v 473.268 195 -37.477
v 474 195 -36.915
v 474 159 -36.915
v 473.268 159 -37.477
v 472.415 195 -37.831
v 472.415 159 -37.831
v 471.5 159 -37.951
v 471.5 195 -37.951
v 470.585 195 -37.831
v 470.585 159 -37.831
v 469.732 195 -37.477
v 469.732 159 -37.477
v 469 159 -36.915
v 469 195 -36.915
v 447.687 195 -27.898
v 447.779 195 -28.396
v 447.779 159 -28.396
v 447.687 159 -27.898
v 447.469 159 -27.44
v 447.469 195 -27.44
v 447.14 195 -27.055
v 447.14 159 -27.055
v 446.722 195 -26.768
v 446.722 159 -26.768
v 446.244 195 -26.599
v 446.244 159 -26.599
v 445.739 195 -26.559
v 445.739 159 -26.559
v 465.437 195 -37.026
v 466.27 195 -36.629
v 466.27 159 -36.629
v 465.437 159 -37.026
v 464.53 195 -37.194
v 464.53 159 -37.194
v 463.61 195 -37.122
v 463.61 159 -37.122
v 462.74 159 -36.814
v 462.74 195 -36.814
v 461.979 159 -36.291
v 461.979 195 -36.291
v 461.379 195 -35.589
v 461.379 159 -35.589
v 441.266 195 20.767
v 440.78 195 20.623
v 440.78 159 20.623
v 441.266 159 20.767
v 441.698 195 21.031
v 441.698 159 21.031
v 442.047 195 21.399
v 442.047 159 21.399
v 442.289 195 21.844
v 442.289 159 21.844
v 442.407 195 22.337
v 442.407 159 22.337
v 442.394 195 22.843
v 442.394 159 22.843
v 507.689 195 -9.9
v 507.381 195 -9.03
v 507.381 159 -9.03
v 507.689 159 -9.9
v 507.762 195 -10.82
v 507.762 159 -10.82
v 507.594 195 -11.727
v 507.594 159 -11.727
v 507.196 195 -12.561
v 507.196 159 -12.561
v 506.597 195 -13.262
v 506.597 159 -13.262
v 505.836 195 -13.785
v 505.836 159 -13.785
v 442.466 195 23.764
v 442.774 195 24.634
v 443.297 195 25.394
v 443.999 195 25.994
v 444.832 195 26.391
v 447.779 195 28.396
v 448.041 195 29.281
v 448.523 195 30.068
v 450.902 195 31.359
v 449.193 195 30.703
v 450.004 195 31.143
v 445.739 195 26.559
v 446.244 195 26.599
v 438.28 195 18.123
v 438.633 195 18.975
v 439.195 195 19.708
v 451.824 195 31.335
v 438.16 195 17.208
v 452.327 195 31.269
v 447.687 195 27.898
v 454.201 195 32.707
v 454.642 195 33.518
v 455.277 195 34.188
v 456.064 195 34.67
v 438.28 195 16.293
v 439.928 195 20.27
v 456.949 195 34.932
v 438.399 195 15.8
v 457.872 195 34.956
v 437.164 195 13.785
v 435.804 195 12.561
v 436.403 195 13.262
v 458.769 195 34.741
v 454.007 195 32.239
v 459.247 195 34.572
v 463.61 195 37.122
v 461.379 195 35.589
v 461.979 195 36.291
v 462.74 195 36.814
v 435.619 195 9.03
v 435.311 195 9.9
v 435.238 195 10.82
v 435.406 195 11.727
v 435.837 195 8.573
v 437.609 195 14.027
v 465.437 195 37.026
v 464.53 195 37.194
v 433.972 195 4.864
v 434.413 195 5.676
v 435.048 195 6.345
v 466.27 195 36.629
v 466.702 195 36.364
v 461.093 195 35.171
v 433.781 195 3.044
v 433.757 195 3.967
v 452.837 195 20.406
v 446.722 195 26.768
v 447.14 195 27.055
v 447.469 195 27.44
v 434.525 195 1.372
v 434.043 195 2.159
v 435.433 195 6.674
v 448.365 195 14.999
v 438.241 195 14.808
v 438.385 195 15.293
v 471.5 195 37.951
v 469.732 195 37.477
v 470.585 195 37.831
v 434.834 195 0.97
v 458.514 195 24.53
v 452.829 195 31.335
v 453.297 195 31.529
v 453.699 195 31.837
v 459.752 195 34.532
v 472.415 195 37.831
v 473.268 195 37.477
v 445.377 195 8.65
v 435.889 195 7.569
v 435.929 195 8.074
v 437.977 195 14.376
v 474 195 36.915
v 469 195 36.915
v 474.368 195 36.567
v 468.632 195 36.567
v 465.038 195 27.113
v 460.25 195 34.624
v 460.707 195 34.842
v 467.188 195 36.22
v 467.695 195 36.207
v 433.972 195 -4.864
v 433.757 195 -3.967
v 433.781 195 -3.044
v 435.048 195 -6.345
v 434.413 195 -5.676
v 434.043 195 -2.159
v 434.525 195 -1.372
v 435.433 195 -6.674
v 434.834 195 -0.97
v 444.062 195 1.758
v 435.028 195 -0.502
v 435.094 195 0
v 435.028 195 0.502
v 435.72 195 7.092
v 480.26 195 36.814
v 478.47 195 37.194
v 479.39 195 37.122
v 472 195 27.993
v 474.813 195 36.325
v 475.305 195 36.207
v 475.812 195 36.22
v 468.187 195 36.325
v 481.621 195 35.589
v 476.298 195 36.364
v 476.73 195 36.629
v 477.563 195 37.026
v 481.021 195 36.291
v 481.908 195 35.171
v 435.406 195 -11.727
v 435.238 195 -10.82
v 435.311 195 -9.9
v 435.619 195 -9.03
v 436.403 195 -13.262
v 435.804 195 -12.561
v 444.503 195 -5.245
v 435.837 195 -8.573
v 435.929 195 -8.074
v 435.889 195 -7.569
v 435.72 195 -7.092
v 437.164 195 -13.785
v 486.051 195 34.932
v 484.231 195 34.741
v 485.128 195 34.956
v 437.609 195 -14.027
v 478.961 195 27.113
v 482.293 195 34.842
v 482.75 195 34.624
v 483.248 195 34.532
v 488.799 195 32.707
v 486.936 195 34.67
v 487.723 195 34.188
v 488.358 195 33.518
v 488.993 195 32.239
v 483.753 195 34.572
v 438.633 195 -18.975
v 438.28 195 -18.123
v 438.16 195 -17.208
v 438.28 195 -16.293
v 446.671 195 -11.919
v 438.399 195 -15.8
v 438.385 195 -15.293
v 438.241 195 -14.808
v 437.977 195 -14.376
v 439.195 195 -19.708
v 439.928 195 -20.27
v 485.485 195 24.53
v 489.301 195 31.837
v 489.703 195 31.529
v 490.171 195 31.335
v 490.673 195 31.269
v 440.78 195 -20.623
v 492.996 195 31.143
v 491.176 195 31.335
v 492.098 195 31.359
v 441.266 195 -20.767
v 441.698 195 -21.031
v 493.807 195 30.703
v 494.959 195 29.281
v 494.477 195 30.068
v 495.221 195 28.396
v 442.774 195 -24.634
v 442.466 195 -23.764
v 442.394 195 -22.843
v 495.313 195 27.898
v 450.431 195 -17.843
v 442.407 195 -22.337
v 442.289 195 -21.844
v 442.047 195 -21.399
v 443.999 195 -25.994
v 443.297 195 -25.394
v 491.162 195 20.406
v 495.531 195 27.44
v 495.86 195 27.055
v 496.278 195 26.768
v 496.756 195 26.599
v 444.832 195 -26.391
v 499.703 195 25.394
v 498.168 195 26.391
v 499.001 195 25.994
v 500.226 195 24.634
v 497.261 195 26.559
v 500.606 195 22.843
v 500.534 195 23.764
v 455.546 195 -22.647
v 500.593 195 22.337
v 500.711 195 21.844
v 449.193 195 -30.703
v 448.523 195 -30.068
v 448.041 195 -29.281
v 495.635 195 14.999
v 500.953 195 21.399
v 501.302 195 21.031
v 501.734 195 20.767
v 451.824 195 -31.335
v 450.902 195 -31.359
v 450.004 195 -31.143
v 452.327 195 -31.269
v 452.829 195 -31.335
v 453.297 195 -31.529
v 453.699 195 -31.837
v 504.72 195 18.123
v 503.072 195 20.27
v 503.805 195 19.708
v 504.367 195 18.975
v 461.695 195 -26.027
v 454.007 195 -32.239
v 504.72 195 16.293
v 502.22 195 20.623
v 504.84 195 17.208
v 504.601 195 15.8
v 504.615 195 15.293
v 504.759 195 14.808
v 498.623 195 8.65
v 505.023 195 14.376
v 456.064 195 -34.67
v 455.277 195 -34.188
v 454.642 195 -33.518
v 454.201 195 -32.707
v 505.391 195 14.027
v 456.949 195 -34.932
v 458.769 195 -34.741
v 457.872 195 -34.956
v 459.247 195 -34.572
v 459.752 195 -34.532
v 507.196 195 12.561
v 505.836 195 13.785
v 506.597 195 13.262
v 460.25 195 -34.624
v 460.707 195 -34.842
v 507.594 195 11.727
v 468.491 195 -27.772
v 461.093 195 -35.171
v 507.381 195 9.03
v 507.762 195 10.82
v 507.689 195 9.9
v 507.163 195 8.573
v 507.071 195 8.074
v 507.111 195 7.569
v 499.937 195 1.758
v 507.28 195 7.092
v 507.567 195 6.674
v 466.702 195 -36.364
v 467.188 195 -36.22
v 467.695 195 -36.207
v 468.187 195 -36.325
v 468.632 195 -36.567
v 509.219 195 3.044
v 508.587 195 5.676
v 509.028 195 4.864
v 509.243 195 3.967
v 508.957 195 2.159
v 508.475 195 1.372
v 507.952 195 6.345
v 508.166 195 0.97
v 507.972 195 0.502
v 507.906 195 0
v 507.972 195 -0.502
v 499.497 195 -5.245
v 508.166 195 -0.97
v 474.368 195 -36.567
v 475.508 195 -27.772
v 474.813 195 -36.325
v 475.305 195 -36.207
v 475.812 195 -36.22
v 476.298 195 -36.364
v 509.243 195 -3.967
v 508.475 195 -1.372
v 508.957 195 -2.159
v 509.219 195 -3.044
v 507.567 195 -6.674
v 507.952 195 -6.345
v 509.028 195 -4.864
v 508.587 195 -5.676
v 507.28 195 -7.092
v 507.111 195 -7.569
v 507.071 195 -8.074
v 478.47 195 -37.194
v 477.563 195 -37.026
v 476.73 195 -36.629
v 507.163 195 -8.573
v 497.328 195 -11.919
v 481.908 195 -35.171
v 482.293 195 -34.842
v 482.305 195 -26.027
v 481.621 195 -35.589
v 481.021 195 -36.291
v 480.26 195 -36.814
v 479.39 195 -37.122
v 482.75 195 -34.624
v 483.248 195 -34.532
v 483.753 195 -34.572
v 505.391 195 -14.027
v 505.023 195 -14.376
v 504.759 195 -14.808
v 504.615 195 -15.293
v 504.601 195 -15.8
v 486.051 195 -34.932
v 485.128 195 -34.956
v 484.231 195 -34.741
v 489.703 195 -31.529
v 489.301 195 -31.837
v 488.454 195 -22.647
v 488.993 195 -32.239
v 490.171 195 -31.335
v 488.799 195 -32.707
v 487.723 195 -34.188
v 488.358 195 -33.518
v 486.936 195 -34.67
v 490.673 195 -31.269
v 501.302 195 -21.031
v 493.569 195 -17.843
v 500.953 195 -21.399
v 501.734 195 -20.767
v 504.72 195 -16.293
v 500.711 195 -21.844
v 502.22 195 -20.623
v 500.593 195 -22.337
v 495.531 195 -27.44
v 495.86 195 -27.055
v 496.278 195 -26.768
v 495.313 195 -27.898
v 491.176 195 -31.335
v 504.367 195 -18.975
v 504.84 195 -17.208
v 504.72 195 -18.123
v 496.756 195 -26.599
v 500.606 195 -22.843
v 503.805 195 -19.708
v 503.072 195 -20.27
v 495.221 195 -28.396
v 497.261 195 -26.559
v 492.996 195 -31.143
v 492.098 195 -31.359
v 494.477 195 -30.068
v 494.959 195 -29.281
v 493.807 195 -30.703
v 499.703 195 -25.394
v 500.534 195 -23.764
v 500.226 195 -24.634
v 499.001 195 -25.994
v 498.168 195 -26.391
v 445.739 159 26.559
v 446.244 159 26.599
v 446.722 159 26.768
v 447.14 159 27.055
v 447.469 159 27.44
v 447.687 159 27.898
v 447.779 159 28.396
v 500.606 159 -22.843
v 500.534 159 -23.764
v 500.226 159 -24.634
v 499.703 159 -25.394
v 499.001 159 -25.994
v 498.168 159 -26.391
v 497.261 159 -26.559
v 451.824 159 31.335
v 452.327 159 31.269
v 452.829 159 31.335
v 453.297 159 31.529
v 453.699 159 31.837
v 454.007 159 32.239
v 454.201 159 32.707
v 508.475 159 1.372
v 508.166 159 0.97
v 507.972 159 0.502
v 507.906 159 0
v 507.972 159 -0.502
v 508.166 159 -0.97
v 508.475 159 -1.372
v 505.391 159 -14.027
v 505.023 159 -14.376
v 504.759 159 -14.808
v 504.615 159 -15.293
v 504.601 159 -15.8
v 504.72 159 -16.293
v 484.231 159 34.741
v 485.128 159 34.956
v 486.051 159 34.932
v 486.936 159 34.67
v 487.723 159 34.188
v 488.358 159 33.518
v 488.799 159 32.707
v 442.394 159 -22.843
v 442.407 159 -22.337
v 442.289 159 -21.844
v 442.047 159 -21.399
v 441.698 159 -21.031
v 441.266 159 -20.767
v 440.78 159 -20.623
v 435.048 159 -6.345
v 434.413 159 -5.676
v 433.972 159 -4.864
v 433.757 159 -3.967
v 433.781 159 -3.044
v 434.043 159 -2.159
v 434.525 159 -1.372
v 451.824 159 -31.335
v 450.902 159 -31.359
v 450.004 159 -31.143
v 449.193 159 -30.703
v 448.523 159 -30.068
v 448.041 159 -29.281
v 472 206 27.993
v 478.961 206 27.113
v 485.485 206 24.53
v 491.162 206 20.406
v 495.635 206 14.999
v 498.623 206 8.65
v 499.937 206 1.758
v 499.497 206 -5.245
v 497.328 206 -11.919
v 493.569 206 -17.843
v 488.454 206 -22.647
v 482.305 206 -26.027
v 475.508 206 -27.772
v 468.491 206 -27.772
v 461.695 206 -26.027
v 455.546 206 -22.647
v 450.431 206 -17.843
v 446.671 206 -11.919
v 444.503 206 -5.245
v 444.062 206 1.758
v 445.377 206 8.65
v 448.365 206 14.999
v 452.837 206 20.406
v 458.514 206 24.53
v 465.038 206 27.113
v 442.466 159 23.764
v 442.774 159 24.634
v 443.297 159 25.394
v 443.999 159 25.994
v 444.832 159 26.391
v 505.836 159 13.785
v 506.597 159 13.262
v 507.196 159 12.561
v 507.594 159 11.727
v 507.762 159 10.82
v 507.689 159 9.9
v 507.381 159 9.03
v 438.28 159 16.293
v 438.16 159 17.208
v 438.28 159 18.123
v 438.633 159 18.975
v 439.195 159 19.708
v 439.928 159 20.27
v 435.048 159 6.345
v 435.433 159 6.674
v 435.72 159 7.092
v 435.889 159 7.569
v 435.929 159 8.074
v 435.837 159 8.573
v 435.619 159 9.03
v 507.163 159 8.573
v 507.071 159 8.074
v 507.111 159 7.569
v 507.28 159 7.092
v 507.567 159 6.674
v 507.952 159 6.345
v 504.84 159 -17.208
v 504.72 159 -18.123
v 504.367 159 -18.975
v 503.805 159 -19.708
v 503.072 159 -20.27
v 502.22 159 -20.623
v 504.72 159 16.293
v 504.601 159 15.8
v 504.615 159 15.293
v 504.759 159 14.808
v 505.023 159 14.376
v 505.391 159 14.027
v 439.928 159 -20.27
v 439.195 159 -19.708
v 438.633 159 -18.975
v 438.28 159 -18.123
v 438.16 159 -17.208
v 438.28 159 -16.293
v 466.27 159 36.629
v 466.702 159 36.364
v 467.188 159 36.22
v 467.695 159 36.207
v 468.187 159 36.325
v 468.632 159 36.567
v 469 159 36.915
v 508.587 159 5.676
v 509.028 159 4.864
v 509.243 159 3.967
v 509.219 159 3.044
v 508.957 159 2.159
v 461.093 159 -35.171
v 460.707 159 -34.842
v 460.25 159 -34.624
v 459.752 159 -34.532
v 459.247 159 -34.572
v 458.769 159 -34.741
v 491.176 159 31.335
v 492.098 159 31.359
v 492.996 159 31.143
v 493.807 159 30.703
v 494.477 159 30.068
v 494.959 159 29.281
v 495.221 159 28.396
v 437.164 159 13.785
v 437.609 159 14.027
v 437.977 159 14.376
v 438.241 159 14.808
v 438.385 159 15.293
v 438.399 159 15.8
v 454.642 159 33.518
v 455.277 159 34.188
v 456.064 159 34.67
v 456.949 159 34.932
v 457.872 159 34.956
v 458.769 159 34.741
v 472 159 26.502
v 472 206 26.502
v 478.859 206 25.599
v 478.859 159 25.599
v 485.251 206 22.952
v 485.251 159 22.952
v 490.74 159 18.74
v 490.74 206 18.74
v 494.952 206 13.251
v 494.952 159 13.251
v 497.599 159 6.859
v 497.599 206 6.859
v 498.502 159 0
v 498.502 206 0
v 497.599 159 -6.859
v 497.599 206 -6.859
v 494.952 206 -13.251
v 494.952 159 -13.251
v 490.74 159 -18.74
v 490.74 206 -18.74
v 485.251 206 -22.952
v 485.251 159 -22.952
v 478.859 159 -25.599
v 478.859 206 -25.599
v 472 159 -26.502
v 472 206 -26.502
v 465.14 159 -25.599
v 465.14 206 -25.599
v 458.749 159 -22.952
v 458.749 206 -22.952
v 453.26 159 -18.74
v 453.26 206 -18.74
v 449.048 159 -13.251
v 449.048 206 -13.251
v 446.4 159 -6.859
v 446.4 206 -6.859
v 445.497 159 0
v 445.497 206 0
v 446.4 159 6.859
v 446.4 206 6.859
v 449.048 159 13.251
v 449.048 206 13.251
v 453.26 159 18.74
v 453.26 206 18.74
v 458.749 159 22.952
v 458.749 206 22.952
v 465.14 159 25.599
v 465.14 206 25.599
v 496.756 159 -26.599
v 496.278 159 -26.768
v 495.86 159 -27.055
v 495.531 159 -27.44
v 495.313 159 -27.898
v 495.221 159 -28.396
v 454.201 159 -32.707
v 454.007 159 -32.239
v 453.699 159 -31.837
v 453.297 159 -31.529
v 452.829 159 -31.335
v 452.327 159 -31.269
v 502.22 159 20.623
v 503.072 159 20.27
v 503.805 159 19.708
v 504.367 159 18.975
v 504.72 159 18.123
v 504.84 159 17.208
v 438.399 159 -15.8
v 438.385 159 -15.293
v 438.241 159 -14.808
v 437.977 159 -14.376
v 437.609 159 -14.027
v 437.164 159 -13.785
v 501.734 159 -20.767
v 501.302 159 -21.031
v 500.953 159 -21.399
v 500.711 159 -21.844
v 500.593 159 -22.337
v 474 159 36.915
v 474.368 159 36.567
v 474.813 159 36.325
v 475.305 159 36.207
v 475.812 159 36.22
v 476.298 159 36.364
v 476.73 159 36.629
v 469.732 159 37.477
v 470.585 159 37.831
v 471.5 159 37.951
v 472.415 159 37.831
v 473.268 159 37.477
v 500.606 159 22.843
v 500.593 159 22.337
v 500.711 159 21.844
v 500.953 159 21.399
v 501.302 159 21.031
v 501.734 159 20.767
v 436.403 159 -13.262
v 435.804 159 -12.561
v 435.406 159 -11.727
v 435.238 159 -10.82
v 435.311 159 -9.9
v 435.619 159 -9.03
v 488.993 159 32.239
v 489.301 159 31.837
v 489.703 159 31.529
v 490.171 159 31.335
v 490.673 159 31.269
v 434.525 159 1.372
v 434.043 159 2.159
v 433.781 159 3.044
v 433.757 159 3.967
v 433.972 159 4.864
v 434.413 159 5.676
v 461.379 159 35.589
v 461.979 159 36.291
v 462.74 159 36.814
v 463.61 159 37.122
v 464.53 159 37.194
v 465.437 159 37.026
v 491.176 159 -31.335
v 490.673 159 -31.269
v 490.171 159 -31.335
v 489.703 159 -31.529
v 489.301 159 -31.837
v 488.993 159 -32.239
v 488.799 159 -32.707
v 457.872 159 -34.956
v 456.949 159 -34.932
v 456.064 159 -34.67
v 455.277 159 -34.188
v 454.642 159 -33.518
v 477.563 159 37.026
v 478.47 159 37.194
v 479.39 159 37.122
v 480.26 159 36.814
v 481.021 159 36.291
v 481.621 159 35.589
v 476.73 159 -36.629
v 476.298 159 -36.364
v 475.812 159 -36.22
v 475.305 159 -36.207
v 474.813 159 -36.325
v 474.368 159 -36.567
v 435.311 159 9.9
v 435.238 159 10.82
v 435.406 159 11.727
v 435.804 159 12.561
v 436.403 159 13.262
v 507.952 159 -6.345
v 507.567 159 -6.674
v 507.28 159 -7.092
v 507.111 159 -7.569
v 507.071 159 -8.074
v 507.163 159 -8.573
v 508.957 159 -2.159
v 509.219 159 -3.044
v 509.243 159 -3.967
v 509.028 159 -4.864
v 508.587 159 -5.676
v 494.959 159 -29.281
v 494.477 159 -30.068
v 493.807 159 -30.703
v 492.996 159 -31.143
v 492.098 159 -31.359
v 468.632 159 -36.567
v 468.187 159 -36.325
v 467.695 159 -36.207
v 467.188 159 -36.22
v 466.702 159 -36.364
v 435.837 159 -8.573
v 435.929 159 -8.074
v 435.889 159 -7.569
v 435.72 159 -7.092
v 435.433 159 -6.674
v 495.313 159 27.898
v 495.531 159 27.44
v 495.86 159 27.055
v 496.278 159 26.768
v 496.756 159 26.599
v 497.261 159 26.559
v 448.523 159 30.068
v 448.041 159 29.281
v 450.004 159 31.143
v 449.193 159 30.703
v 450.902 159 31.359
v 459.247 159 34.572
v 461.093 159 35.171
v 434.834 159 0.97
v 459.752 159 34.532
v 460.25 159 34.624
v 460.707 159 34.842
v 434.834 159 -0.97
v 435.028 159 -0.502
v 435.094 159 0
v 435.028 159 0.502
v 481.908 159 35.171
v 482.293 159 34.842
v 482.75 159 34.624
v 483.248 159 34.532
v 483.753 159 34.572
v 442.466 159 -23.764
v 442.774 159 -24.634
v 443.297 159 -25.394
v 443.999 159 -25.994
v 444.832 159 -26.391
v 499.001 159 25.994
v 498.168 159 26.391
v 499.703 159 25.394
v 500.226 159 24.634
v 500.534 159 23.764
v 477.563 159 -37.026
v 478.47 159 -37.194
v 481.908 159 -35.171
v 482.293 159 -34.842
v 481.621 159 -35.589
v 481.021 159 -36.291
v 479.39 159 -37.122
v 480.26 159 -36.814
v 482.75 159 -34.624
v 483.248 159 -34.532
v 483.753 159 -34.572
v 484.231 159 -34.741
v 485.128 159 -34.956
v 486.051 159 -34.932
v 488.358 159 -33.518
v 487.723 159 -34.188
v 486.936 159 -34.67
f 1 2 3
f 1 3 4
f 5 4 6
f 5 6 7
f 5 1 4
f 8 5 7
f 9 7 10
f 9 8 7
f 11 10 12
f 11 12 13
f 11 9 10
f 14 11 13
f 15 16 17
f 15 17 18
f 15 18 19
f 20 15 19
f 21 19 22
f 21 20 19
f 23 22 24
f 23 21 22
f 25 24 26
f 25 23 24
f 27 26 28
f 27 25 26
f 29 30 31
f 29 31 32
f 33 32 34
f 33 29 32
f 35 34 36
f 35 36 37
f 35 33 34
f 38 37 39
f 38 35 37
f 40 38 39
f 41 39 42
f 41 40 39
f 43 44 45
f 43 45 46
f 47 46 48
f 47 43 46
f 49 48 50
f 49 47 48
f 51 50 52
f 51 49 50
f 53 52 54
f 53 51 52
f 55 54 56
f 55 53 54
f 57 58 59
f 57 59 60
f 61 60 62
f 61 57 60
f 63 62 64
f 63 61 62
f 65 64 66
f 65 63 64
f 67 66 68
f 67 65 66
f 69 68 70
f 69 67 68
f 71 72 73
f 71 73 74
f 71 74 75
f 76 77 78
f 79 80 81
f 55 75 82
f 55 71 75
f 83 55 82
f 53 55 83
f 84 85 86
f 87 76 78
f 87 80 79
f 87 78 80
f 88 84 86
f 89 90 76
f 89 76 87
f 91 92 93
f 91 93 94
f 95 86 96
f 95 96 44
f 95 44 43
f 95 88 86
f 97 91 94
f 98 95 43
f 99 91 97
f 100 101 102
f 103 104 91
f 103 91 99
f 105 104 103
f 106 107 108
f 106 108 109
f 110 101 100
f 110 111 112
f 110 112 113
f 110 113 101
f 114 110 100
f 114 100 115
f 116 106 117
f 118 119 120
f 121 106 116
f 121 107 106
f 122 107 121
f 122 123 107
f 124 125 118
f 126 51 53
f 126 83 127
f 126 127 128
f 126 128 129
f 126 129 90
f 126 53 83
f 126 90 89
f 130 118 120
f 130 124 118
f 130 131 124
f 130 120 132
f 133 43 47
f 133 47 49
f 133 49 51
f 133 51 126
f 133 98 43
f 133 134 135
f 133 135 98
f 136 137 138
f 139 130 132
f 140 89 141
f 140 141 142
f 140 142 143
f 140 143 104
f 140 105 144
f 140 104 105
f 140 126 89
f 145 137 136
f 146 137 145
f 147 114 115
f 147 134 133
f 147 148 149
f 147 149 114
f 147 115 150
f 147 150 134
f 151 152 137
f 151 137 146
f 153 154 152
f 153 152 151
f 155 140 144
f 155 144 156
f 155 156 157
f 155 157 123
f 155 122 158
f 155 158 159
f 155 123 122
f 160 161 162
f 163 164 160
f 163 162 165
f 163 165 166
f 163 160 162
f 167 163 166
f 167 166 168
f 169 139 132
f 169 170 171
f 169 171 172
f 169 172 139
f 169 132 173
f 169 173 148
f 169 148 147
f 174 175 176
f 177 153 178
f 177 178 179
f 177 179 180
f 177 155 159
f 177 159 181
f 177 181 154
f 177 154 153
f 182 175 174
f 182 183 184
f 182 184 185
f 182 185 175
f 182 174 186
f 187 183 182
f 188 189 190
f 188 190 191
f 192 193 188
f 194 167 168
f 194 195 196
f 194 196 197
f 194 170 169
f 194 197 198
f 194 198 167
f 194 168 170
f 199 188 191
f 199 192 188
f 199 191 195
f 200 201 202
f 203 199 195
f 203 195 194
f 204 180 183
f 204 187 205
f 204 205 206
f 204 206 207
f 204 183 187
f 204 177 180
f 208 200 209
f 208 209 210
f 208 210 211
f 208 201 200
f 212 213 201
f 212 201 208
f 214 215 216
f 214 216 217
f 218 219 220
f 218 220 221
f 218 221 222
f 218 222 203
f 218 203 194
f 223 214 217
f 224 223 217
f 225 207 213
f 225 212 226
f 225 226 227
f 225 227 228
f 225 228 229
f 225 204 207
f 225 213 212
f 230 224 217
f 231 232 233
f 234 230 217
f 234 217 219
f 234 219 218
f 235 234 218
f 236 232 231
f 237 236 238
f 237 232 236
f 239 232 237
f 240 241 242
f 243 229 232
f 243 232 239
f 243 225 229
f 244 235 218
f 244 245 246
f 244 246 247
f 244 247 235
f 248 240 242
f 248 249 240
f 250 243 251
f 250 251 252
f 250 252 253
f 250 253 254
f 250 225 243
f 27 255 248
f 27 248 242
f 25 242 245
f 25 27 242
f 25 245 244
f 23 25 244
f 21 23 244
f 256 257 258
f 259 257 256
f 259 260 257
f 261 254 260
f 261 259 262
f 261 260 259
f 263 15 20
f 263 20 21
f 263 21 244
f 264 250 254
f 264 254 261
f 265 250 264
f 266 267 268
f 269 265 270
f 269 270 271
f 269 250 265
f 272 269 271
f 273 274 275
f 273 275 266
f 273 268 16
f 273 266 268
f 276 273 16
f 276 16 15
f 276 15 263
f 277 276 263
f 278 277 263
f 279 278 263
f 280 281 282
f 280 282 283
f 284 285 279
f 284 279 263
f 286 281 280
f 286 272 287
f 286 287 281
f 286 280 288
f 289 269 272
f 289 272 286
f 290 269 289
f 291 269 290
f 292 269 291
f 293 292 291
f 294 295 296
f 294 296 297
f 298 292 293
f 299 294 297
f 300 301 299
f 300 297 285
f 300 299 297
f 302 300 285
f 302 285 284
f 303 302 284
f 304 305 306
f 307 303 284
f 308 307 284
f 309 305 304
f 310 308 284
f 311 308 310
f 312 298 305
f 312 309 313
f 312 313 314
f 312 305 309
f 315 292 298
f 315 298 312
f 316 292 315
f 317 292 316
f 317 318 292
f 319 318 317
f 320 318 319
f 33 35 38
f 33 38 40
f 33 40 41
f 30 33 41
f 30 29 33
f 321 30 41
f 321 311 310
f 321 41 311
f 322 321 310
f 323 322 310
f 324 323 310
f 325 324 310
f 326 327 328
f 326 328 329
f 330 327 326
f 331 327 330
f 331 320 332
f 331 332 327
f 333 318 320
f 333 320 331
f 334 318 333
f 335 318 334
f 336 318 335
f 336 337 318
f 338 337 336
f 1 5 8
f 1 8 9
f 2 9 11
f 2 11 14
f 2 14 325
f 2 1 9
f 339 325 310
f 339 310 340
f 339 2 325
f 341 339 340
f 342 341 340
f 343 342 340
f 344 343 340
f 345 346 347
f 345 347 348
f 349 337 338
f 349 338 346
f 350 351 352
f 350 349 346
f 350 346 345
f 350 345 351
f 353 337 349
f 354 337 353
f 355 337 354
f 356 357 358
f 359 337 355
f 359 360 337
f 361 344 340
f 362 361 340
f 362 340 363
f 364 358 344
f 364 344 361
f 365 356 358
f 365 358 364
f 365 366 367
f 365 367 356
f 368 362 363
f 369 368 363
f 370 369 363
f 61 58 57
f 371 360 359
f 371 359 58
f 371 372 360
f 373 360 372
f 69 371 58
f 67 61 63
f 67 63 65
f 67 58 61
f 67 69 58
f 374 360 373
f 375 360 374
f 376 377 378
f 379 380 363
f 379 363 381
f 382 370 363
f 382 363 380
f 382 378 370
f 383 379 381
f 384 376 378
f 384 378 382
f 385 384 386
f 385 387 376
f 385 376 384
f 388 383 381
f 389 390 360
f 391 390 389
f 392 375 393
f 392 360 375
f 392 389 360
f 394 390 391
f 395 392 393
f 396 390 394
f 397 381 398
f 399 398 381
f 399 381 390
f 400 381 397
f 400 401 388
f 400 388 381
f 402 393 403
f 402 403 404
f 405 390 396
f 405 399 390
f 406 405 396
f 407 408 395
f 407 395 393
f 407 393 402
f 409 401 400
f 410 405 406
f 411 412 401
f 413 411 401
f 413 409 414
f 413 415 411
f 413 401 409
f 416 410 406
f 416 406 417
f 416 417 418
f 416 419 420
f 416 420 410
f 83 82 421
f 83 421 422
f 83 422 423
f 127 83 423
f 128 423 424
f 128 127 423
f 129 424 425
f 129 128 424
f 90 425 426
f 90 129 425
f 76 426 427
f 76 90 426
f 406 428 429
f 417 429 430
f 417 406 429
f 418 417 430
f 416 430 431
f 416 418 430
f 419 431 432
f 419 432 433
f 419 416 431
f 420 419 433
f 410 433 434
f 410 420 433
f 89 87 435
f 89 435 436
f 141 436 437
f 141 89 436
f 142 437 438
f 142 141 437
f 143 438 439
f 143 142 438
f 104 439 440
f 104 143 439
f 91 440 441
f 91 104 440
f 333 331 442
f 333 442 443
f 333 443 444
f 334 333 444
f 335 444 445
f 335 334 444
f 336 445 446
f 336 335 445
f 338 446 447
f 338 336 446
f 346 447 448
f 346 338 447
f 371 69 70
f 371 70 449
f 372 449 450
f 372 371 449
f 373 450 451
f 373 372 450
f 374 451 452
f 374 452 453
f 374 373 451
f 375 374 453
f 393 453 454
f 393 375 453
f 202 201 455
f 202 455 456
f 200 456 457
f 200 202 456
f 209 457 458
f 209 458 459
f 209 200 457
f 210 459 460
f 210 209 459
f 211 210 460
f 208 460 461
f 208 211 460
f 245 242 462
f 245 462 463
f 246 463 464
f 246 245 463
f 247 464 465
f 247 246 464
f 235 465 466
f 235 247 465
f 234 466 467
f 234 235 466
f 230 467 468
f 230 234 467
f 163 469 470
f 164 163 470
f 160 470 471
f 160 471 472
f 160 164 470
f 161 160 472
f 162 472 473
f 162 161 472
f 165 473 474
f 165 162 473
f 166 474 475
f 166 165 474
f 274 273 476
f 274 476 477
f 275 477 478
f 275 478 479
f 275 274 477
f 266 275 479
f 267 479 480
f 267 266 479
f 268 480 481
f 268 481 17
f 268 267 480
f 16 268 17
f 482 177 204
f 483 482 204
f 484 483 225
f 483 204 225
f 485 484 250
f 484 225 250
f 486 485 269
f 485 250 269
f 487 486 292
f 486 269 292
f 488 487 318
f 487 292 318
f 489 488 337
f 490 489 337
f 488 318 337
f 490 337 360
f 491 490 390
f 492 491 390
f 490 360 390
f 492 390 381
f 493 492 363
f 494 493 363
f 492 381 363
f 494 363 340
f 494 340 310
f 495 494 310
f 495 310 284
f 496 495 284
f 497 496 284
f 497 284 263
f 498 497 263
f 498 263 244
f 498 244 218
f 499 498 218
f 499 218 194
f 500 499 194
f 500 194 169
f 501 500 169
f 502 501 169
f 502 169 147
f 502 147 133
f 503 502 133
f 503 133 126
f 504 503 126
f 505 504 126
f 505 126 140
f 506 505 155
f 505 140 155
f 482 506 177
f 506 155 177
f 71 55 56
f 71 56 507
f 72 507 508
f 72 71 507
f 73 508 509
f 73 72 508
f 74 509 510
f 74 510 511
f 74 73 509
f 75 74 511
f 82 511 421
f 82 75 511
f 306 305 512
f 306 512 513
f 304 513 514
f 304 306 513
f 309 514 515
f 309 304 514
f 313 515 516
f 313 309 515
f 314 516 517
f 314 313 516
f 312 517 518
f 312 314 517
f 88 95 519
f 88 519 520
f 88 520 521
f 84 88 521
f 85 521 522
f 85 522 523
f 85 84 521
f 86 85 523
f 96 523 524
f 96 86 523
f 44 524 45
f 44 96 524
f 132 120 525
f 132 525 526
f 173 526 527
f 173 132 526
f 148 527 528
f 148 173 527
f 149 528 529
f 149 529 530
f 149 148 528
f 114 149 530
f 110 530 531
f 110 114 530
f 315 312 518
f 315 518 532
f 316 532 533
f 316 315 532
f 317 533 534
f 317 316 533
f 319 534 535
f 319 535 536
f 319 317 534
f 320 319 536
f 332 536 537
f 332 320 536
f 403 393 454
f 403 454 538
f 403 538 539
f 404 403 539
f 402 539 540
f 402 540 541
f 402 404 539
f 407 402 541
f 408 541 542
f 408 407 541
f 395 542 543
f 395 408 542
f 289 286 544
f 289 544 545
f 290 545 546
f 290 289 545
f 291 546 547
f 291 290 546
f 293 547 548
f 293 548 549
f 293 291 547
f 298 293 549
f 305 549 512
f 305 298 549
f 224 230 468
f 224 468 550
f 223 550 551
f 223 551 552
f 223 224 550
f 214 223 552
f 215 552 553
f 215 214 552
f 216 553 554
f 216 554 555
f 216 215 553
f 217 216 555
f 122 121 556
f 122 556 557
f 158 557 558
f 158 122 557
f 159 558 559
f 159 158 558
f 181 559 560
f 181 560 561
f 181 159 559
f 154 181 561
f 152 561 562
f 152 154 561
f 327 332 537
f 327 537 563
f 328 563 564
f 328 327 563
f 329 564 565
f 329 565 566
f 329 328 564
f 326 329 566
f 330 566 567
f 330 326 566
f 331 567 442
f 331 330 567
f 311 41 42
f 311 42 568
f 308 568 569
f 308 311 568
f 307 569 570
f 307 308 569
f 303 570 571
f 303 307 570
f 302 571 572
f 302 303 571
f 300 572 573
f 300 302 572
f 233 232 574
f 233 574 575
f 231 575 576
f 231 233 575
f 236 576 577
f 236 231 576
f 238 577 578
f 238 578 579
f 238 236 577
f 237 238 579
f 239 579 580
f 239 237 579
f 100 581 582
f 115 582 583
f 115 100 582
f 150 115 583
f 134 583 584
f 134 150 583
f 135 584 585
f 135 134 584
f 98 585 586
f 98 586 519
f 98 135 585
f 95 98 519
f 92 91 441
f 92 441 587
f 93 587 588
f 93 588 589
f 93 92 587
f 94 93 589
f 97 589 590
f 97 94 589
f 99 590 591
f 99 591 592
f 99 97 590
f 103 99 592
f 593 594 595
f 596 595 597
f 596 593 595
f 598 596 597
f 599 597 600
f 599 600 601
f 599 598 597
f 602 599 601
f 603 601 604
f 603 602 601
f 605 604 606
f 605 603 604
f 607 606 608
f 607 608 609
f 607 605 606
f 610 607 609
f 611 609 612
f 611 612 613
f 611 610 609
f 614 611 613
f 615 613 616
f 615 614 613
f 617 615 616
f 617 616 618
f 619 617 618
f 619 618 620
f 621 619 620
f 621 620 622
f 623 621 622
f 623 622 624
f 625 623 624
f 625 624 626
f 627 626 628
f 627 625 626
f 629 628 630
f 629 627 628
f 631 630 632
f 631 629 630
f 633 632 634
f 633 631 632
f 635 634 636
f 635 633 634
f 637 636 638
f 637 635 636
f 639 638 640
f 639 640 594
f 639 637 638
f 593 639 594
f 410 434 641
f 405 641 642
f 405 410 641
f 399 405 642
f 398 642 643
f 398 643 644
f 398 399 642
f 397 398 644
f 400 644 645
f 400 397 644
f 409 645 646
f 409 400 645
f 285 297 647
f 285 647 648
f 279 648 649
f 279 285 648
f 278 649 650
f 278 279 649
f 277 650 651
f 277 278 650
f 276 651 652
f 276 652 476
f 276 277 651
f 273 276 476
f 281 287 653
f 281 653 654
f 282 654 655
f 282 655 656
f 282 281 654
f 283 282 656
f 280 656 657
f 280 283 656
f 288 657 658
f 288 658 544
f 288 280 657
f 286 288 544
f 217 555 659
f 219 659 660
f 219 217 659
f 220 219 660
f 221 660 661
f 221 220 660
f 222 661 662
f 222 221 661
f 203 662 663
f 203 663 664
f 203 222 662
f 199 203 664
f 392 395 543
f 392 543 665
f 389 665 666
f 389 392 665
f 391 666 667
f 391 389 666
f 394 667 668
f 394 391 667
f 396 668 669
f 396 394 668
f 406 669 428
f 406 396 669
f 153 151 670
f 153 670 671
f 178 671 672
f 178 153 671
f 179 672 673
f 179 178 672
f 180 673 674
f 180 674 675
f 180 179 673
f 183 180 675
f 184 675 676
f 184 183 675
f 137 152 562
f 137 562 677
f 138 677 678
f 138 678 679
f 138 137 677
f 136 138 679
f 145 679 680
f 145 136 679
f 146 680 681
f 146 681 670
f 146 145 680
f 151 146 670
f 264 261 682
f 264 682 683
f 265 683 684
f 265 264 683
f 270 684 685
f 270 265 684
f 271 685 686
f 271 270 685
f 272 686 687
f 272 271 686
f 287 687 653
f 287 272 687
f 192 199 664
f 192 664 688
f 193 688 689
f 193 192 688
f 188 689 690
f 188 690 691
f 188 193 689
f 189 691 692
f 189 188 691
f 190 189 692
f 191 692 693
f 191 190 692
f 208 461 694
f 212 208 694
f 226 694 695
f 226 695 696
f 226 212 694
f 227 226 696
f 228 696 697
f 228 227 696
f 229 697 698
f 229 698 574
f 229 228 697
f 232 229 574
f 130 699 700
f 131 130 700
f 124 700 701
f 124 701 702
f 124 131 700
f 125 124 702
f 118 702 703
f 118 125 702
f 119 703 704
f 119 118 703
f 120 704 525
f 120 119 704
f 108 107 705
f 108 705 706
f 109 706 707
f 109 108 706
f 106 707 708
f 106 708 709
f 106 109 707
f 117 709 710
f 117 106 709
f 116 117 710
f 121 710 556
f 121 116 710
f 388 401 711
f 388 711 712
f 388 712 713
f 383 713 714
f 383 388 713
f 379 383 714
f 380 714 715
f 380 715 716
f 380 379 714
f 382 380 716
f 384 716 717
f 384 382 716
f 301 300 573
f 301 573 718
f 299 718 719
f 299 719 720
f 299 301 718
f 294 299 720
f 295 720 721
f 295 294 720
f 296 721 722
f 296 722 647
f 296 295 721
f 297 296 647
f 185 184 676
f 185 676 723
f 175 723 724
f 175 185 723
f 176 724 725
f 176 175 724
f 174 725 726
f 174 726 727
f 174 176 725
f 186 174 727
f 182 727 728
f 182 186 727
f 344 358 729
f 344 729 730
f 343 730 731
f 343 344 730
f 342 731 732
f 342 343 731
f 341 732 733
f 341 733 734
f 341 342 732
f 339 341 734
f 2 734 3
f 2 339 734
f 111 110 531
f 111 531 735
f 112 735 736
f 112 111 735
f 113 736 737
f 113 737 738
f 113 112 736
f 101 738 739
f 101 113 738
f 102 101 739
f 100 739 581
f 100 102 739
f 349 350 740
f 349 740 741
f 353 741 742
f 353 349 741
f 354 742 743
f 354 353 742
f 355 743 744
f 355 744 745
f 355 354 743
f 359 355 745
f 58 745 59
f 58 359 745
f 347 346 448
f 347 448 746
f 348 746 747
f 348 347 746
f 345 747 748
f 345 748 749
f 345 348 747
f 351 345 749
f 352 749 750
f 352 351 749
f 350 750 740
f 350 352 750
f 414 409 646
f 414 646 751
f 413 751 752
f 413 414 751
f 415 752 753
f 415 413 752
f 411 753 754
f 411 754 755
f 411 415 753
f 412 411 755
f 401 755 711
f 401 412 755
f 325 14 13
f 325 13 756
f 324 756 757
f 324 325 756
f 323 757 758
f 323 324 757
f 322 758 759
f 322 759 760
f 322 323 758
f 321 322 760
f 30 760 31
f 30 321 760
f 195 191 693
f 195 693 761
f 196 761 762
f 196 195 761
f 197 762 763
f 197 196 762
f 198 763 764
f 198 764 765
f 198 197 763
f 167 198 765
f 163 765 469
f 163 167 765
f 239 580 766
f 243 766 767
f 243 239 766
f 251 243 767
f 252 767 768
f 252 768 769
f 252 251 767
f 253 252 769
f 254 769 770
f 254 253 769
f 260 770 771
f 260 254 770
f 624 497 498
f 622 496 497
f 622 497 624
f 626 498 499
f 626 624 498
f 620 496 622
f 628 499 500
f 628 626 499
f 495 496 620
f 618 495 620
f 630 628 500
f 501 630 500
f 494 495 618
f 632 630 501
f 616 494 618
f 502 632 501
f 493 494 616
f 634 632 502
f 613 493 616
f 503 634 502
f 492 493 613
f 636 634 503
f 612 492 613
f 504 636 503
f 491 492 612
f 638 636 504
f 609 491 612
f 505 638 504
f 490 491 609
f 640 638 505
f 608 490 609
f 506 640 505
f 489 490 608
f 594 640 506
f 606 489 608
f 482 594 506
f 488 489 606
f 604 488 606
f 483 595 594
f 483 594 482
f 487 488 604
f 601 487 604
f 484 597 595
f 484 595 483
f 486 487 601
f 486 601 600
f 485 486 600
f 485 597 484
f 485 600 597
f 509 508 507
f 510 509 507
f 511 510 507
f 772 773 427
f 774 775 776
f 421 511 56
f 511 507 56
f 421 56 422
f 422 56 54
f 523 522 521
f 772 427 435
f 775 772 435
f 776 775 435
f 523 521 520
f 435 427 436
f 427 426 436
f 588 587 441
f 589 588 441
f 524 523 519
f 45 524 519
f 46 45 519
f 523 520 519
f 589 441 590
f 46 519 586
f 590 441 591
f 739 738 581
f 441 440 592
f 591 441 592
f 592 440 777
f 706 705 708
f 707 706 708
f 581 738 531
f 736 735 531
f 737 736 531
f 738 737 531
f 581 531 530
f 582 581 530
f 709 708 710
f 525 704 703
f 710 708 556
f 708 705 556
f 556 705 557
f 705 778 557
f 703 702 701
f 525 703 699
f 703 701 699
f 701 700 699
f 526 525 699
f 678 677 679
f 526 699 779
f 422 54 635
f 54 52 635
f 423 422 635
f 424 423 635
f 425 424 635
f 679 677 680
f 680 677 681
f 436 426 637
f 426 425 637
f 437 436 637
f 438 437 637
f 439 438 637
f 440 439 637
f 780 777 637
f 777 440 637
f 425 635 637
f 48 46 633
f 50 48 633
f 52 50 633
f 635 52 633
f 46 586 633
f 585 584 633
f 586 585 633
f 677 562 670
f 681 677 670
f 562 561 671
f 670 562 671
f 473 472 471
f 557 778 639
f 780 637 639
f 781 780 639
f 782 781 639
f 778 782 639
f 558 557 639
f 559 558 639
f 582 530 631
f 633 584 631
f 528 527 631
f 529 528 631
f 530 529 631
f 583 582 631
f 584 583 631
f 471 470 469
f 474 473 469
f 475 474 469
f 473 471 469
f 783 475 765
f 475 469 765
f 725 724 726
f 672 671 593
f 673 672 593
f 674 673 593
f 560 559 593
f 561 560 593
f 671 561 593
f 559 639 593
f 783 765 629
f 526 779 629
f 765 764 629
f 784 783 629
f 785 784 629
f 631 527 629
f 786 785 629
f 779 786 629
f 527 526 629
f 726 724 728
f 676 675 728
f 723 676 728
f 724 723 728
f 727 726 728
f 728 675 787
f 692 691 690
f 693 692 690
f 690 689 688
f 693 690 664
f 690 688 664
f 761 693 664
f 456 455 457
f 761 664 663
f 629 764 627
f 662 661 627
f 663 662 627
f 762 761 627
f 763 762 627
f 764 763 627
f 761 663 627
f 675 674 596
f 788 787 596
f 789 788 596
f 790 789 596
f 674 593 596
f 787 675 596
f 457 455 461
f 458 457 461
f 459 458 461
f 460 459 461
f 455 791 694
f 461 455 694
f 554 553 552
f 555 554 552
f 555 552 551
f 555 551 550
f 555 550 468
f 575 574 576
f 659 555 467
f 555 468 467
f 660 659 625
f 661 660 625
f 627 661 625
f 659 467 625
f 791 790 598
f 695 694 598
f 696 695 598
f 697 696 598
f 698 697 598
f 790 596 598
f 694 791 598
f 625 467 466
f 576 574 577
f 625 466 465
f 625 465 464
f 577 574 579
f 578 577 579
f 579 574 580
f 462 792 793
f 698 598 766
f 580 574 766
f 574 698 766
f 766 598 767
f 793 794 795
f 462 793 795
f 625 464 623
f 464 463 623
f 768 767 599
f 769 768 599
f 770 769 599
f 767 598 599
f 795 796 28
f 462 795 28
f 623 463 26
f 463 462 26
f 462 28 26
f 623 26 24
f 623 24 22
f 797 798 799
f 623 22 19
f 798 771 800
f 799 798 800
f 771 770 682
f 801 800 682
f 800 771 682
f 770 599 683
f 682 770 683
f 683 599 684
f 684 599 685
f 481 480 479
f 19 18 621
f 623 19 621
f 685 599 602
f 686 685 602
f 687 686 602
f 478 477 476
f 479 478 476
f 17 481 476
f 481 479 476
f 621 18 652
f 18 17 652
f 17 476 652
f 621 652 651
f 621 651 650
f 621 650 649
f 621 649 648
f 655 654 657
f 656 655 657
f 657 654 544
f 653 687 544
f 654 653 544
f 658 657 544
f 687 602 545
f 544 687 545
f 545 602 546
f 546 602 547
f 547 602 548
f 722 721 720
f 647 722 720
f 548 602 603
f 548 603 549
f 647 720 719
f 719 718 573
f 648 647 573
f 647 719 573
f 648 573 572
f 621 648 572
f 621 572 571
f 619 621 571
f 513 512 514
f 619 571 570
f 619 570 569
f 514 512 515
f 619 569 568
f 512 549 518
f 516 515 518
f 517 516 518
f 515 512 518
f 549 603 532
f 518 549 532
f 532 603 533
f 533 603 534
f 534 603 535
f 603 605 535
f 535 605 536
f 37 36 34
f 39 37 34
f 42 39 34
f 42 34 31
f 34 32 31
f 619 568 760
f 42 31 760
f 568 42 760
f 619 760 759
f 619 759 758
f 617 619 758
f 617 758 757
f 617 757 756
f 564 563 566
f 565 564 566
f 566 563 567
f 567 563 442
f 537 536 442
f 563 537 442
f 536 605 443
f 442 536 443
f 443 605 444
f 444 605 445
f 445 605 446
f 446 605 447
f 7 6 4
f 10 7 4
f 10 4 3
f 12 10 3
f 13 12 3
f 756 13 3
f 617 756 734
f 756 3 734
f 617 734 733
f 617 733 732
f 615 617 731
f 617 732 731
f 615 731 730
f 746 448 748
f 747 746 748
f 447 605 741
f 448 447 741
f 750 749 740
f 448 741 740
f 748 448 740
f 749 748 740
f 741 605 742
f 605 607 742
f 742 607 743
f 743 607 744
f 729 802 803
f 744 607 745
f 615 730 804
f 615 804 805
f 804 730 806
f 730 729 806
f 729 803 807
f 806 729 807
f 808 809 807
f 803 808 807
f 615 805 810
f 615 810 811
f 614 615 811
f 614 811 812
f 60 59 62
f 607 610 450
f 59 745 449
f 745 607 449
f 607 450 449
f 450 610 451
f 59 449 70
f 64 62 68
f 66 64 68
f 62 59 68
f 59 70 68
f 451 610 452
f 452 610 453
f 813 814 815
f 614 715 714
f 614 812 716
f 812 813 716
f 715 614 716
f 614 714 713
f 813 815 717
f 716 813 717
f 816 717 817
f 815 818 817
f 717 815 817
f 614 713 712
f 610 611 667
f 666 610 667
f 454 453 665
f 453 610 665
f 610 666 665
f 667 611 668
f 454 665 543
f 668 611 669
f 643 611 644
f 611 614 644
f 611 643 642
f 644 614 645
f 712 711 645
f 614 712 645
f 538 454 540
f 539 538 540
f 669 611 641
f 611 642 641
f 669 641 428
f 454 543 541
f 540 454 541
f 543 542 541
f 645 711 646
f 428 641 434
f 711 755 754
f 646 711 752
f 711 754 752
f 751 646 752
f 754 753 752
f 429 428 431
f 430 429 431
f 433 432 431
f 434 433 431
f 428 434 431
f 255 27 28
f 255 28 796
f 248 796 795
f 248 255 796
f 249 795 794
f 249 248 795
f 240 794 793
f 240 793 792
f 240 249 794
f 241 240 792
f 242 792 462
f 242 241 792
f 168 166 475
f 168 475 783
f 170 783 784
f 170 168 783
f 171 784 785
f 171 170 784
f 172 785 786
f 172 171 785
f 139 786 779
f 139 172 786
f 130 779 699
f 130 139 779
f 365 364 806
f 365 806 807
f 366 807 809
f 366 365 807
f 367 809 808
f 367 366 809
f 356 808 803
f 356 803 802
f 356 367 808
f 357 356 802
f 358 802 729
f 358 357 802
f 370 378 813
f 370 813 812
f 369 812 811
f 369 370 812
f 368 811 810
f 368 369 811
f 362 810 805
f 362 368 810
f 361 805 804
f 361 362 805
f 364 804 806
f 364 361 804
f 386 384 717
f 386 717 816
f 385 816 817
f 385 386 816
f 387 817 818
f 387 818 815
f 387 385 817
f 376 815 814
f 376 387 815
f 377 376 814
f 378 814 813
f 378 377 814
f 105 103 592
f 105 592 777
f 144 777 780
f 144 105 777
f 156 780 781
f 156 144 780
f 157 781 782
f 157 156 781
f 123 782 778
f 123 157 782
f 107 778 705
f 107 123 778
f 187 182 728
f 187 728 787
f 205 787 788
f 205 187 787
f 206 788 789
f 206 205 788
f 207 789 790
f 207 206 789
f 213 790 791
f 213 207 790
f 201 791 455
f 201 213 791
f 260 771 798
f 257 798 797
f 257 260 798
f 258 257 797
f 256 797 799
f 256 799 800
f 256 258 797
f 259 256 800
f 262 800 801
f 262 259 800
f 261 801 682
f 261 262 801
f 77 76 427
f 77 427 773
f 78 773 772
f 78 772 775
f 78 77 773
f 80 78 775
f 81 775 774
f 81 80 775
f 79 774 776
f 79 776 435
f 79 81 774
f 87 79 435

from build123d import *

# Parameters (mm, degrees)
SKETCH7_R                = 27.493094195
BOSS_EXTRUDE2_DEPTH      = 36
BOSS_EXTRUDE3_DEPTH      = 11
BOSS_EXTRUDE3_DEPTH_BACK = 36
SKETCH8_R                = 27.992837321
SKETCH8_R_2              = 26.502402217


with BuildPart() as part:
    # Sketch7 → Boss-Extrude2 (new body)
    with BuildSketch(Plane(origin=(0, 195, 0), x_dir=(1, 0, 0), z_dir=(0, 1, 0))):
        with BuildLine():
            ThreePointArc((469.000007042, -36.915443923), (471.500007042, -37.950977828), (474.000007042, -36.915443923))
            ThreePointArc((474.000007042, -36.915443923), (475.305477345, -36.206631381), (476.729790403, -36.62853213))
            ThreePointArc((476.729790403, -36.62853213), (479.390459011, -37.121657908), (481.620528407, -35.588973676))
            ThreePointArc((481.620528407, -35.588973676), (482.750100638, -34.624227851), (484.231007137, -34.74077772))
            ThreePointArc((484.231007137, -34.74077772), (486.936060365, -34.669943408), (488.798734425, -32.707094505))
            ThreePointArc((488.798734425, -32.707094505), (489.703040856, -31.528579418), (491.175818076, -31.334684619))
            ThreePointArc((491.175818076, -31.334684619), (493.80703212, -30.702986016), (495.220903048, -28.395758358))
            ThreePointArc((495.220903048, -28.395758358), (495.86042115, -27.054980774), (497.260701657, -26.55911544))
            ThreePointArc((497.260701657, -26.55911544), (499.703079837, -25.394160806), (500.606354689, -22.843391312))
            ThreePointArc((500.606354689, -22.843391312), (500.953134452, -21.398949646), (502.219719271, -20.622785471))
            ThreePointArc((502.219719271, -20.622785471), (504.36651794, -18.975488914), (504.719719271, -16.292658452))
            ThreePointArc((504.719719271, -16.292658452), (504.758604755, -14.807681735), (505.836138051, -13.785140818))
            ThreePointArc((505.836138051, -13.785140818), (507.593531806, -11.727497102), (507.381223022, -9.029858236))
            ThreePointArc((507.381223022, -9.029858236), (507.110514745, -7.569247077), (507.951903142, -6.345019362))
            ThreePointArc((507.951903142, -6.345019362), (509.243085443, -3.966957392), (508.474545458, -1.372409886))
            ThreePointArc((508.474545458, -1.372409886), (507.906074671, 0), (508.474545458, 1.372409886))
            ThreePointArc((508.474545458, 1.372409886), (509.243085443, 3.966957392), (507.951903142, 6.345019362))
            ThreePointArc((507.951903142, 6.345019362), (507.110514745, 7.569247077), (507.381223022, 9.029858236))
            ThreePointArc((507.381223022, 9.029858236), (507.593531806, 11.727497102), (505.836138051, 13.785140818))
            ThreePointArc((505.836138051, 13.785140818), (504.758604755, 14.807681735), (504.719719271, 16.292658452))
            ThreePointArc((504.719719271, 16.292658452), (504.36651794, 18.975488914), (502.219719271, 20.622785471))
            ThreePointArc((502.219719271, 20.622785471), (500.953134452, 21.398949646), (500.606354689, 22.843391312))
            ThreePointArc((500.606354689, 22.843391312), (499.703079837, 25.394160806), (497.260701657, 26.55911544))
            ThreePointArc((497.260701657, 26.55911544), (495.86042115, 27.054980774), (495.220903048, 28.395758358))
            ThreePointArc((495.220903048, 28.395758358), (493.80703212, 30.702986016), (491.175818076, 31.334684619))
            ThreePointArc((491.175818076, 31.334684619), (489.703040856, 31.528579418), (488.798734425, 32.707094505))
            ThreePointArc((488.798734425, 32.707094505), (486.936060365, 34.669943408), (484.231007137, 34.74077772))
            ThreePointArc((484.231007137, 34.74077772), (482.750100638, 34.624227851), (481.620528407, 35.588973676))
            ThreePointArc((481.620528407, 35.588973676), (479.390459011, 37.121657908), (476.729790403, 36.62853213))
            ThreePointArc((476.729790403, 36.62853213), (475.305477345, 36.206631381), (474.000007042, 36.915443923))
            ThreePointArc((474.000007042, 36.915443923), (471.500007042, 37.950977828), (469.000007042, 36.915443923))
            ThreePointArc((469.000007042, 36.915443923), (467.694536739, 36.206631381), (466.270223681, 36.62853213))
            ThreePointArc((466.270223681, 36.62853213), (463.609555074, 37.121657908), (461.379485677, 35.588973676))
            ThreePointArc((461.379485677, 35.588973676), (460.249913446, 34.624227851), (458.769006947, 34.74077772))
            ThreePointArc((458.769006947, 34.74077772), (456.063953719, 34.669943408), (454.201279659, 32.707094505))
            ThreePointArc((454.201279659, 32.707094505), (453.296973228, 31.528579418), (451.824196008, 31.334684619))
            ThreePointArc((451.824196008, 31.334684619), (449.192981964, 30.702986016), (447.779111037, 28.395758358))
            ThreePointArc((447.779111037, 28.395758358), (447.139592935, 27.054980774), (445.739312427, 26.55911544))
            ThreePointArc((445.739312427, 26.55911544), (443.296934247, 25.394160806), (442.393659395, 22.843391312))
            ThreePointArc((442.393659395, 22.843391312), (442.046879632, 21.398949646), (440.780294813, 20.622785471))
            ThreePointArc((440.780294813, 20.622785471), (438.633496144, 18.975488914), (438.280294813, 16.292658452))
            ThreePointArc((438.280294813, 16.292658452), (438.241409329, 14.807681735), (437.163876034, 13.785140818))
            ThreePointArc((437.163876034, 13.785140818), (435.406482279, 11.727497102), (435.618791062, 9.029858236))
            ThreePointArc((435.618791062, 9.029858236), (435.889499339, 7.569247077), (435.048110942, 6.345019362))
            ThreePointArc((435.048110942, 6.345019362), (433.756928641, 3.966957392), (434.525468626, 1.372409886))
            ThreePointArc((434.525468626, 1.372409886), (435.093939413, 0), (434.525468626, -1.372409886))
            ThreePointArc((434.525468626, -1.372409886), (433.756928641, -3.966957392), (435.048110942, -6.345019362))
            ThreePointArc((435.048110942, -6.345019362), (435.889499339, -7.569247077), (435.618791062, -9.029858236))
            ThreePointArc((435.618791062, -9.029858236), (435.406482279, -11.727497102), (437.163876034, -13.785140818))
            ThreePointArc((437.163876034, -13.785140818), (438.241409329, -14.807681735), (438.280294813, -16.292658452))
            ThreePointArc((438.280294813, -16.292658452), (438.633496144, -18.975488914), (440.780294813, -20.622785471))
            ThreePointArc((440.780294813, -20.622785471), (442.046879632, -21.398949646), (442.393659395, -22.843391312))
            ThreePointArc((442.393659395, -22.843391312), (443.296934247, -25.394160806), (445.739312427, -26.55911544))
            ThreePointArc((445.739312427, -26.55911544), (447.139592935, -27.054980774), (447.779111037, -28.395758358))
            ThreePointArc((447.779111037, -28.395758358), (449.192981964, -30.702986016), (451.824196008, -31.334684619))
            ThreePointArc((451.824196008, -31.334684619), (453.296973228, -31.528579418), (454.201279659, -32.707094505))
            ThreePointArc((454.201279659, -32.707094505), (456.063953719, -34.669943408), (458.769006947, -34.74077772))
            ThreePointArc((458.769006947, -34.74077772), (460.249913446, -34.624227851), (461.379485677, -35.588973676))
            ThreePointArc((461.379485677, -35.588973676), (463.609555074, -37.121657908), (466.270223681, -36.62853213))
            ThreePointArc((466.270223681, -36.62853213), (467.694536739, -36.206631381), (469.000007042, -36.915443923))
        make_face()
        with Locations(Location((471.500007042, 0, 0), (0, 0, 270))):
            Circle(SKETCH7_R, mode=Mode.SUBTRACT)
    extrude(amount=-BOSS_EXTRUDE2_DEPTH)

    # Sketch8 → Boss-Extrude3 (add, two sides: drawn at the far end of the back side and taken through both)
    with BuildSketch(Plane(origin=(0, 195, 0), x_dir=(1, 0, 0), z_dir=(0, 1, 0)).offset(-BOSS_EXTRUDE3_DEPTH_BACK)):
        with Locations(Location((471.999750168, 0, 0), (0, 0, 270))):
            Circle(SKETCH8_R)
        with Locations(Location((471.999750168, 0, 0), (0, 0, 270))):
            Circle(SKETCH8_R_2, mode=Mode.SUBTRACT)
    extrude(amount=BOSS_EXTRUDE3_DEPTH + BOSS_EXTRUDE3_DEPTH_BACK)


solid = part.part
